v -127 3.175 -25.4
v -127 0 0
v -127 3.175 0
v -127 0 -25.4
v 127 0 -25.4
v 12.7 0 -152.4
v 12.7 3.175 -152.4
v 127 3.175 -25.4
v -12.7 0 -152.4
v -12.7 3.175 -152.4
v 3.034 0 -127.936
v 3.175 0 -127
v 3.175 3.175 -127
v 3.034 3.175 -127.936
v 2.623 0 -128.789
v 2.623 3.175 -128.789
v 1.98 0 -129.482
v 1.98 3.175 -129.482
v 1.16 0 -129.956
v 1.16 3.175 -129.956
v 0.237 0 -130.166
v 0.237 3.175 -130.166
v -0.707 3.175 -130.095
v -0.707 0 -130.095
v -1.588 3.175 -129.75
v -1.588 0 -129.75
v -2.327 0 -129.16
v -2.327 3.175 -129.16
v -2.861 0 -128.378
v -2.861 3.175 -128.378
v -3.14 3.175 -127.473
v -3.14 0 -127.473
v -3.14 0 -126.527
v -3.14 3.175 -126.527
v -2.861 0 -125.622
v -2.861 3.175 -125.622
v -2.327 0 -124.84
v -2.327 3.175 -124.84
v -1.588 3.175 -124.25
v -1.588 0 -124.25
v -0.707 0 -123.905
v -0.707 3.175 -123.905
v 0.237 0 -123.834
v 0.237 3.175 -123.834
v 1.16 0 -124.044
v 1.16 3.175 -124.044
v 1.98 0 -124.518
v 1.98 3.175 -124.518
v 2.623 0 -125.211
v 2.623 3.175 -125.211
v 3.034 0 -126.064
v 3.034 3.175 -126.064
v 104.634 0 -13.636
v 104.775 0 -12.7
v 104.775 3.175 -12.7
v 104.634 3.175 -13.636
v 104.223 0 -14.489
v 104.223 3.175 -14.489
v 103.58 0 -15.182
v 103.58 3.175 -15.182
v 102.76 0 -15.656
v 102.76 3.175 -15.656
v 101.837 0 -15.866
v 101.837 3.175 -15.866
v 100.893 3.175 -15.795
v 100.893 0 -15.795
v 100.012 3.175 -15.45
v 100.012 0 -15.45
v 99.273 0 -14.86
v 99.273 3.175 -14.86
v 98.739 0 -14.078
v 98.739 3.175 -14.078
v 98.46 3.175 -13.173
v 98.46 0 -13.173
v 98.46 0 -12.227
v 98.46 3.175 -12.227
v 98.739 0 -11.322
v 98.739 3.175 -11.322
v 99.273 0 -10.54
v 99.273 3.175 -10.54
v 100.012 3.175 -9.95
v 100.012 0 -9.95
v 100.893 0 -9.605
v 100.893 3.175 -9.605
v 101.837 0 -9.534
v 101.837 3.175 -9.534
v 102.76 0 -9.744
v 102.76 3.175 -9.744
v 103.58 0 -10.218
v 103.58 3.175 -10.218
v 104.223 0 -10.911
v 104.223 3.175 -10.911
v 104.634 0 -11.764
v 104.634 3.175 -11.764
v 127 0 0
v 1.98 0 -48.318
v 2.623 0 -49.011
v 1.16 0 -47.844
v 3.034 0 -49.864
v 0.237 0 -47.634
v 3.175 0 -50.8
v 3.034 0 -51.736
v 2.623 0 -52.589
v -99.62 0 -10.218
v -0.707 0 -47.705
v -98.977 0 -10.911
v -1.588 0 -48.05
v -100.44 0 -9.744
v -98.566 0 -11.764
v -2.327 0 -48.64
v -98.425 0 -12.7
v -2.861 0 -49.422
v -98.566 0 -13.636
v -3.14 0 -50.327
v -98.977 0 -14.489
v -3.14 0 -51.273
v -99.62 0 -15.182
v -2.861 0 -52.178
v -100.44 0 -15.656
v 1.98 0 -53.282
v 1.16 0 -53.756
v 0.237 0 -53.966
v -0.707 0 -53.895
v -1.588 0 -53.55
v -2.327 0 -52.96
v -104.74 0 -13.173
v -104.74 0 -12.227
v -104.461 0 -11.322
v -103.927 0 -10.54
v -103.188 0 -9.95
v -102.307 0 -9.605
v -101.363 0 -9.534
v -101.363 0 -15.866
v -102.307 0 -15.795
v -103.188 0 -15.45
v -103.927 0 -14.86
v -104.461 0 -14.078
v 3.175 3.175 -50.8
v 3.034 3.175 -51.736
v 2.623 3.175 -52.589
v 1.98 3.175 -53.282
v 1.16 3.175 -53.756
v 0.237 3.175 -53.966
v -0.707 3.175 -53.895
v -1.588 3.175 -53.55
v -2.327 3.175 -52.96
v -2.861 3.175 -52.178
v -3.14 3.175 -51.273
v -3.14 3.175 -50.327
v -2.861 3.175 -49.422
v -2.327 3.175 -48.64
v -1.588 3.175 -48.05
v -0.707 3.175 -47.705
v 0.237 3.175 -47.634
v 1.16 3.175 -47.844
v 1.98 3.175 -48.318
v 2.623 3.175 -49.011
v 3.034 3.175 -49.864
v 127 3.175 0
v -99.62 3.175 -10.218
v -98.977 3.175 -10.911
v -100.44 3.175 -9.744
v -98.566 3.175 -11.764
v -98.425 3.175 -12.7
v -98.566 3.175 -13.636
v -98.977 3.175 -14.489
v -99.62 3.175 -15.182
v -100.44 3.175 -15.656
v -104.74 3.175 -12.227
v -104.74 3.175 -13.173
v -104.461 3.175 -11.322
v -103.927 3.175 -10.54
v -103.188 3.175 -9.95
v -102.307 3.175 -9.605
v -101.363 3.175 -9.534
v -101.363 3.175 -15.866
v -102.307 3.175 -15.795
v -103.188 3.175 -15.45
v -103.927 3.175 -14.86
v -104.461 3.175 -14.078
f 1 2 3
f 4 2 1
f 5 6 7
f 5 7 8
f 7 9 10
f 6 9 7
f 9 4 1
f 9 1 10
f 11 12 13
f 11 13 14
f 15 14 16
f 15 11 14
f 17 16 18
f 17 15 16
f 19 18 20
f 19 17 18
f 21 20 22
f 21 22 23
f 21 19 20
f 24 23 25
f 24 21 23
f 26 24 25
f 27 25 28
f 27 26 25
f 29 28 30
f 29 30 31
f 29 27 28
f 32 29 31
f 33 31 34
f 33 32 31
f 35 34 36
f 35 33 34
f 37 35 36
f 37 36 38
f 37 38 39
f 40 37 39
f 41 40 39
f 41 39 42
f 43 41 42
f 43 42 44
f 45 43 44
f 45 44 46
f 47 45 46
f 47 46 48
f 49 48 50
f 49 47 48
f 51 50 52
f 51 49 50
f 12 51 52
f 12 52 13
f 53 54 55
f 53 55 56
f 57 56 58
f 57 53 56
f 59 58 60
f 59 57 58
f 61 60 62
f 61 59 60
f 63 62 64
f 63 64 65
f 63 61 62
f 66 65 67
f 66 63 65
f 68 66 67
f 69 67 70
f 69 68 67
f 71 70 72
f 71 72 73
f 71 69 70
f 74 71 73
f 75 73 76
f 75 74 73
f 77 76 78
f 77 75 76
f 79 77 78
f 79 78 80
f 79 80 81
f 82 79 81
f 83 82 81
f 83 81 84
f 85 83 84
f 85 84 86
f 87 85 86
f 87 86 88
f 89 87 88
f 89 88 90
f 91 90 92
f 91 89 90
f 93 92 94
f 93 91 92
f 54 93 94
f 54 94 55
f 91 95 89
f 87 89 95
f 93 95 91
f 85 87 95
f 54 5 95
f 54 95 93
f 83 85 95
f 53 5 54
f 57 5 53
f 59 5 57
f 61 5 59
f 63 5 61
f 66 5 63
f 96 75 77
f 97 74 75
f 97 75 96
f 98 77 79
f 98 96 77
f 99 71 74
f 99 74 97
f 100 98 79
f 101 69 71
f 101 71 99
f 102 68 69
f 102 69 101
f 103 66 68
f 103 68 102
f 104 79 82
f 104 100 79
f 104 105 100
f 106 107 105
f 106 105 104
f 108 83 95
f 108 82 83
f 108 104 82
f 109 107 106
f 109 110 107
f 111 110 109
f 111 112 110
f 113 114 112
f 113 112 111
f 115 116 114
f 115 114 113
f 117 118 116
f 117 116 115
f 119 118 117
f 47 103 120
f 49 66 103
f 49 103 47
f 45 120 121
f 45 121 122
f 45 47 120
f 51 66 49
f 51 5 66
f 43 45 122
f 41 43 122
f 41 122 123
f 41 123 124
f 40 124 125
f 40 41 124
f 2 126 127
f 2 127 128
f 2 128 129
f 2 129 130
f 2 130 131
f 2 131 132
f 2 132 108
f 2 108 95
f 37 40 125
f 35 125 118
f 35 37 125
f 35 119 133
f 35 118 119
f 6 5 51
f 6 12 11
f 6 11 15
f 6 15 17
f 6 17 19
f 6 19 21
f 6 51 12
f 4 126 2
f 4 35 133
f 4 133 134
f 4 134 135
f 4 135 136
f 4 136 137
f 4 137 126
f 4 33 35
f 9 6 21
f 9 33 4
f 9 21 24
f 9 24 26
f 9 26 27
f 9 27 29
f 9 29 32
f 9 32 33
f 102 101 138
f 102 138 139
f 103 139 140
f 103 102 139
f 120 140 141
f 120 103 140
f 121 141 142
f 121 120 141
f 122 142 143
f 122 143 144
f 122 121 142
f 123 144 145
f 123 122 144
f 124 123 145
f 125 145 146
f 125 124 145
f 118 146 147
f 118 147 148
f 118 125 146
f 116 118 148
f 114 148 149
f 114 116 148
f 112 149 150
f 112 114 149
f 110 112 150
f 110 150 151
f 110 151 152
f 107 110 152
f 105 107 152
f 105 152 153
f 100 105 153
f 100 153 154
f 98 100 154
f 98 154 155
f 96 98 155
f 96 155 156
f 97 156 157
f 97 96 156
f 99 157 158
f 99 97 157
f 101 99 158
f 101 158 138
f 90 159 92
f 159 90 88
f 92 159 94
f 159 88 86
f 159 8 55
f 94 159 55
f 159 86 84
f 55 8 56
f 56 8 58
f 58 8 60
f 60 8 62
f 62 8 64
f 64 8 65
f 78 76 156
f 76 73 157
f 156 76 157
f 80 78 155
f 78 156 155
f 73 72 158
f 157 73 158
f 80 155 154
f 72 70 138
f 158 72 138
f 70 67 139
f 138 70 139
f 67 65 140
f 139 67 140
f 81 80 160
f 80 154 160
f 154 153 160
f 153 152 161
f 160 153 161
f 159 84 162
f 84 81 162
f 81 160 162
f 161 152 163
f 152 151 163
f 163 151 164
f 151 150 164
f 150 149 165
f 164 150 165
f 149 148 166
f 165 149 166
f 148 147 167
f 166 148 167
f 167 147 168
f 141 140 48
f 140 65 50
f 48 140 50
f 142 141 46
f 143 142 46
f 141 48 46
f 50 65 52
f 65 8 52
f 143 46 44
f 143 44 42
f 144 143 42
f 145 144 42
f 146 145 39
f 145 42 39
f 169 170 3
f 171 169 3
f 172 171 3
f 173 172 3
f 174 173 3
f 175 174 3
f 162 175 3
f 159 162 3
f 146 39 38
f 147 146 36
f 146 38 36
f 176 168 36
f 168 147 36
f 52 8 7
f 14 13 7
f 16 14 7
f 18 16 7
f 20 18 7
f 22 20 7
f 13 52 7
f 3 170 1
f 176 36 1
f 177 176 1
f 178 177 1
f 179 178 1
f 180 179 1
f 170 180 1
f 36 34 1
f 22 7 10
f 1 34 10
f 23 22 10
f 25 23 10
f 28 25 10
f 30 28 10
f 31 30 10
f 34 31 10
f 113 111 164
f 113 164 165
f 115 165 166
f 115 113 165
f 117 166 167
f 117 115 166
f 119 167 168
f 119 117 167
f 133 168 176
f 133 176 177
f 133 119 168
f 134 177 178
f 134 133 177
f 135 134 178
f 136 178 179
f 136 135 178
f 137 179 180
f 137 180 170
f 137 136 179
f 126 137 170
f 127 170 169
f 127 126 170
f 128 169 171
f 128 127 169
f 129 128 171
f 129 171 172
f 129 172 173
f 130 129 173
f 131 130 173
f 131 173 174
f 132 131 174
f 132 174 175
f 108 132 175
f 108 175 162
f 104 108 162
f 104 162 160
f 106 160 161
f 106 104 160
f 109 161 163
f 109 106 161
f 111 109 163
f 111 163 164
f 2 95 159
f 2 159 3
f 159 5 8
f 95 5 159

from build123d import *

# Parameters (mm, degrees)
SKETCH1_R           = 3.175
BOSS_EXTRUDE1_DEPTH = 3.175


with BuildPart() as part:
    # Sketch1 → Boss-Extrude1 (new body)
    with BuildSketch(Plane(origin=(0, 0, 0), x_dir=(1, 0, 0), z_dir=(0, 1, 0))):
        Polygon((127, 0), (-127, 0), (-127, 25.4), (-12.7, 152.4), (12.7, 152.4), (127, 25.4), align=None)
        with Locations((0, 127)):
            Circle(SKETCH1_R, mode=Mode.SUBTRACT)
        with Locations((0, 50.8)):
            Circle(SKETCH1_R, mode=Mode.SUBTRACT)
        with Locations((-101.6, 12.7)):
            Circle(SKETCH1_R, mode=Mode.SUBTRACT)
        with Locations((101.6, 12.7)):
            Circle(SKETCH1_R, mode=Mode.SUBTRACT)
    extrude(amount=BOSS_EXTRUDE1_DEPTH)


solid = part.part
